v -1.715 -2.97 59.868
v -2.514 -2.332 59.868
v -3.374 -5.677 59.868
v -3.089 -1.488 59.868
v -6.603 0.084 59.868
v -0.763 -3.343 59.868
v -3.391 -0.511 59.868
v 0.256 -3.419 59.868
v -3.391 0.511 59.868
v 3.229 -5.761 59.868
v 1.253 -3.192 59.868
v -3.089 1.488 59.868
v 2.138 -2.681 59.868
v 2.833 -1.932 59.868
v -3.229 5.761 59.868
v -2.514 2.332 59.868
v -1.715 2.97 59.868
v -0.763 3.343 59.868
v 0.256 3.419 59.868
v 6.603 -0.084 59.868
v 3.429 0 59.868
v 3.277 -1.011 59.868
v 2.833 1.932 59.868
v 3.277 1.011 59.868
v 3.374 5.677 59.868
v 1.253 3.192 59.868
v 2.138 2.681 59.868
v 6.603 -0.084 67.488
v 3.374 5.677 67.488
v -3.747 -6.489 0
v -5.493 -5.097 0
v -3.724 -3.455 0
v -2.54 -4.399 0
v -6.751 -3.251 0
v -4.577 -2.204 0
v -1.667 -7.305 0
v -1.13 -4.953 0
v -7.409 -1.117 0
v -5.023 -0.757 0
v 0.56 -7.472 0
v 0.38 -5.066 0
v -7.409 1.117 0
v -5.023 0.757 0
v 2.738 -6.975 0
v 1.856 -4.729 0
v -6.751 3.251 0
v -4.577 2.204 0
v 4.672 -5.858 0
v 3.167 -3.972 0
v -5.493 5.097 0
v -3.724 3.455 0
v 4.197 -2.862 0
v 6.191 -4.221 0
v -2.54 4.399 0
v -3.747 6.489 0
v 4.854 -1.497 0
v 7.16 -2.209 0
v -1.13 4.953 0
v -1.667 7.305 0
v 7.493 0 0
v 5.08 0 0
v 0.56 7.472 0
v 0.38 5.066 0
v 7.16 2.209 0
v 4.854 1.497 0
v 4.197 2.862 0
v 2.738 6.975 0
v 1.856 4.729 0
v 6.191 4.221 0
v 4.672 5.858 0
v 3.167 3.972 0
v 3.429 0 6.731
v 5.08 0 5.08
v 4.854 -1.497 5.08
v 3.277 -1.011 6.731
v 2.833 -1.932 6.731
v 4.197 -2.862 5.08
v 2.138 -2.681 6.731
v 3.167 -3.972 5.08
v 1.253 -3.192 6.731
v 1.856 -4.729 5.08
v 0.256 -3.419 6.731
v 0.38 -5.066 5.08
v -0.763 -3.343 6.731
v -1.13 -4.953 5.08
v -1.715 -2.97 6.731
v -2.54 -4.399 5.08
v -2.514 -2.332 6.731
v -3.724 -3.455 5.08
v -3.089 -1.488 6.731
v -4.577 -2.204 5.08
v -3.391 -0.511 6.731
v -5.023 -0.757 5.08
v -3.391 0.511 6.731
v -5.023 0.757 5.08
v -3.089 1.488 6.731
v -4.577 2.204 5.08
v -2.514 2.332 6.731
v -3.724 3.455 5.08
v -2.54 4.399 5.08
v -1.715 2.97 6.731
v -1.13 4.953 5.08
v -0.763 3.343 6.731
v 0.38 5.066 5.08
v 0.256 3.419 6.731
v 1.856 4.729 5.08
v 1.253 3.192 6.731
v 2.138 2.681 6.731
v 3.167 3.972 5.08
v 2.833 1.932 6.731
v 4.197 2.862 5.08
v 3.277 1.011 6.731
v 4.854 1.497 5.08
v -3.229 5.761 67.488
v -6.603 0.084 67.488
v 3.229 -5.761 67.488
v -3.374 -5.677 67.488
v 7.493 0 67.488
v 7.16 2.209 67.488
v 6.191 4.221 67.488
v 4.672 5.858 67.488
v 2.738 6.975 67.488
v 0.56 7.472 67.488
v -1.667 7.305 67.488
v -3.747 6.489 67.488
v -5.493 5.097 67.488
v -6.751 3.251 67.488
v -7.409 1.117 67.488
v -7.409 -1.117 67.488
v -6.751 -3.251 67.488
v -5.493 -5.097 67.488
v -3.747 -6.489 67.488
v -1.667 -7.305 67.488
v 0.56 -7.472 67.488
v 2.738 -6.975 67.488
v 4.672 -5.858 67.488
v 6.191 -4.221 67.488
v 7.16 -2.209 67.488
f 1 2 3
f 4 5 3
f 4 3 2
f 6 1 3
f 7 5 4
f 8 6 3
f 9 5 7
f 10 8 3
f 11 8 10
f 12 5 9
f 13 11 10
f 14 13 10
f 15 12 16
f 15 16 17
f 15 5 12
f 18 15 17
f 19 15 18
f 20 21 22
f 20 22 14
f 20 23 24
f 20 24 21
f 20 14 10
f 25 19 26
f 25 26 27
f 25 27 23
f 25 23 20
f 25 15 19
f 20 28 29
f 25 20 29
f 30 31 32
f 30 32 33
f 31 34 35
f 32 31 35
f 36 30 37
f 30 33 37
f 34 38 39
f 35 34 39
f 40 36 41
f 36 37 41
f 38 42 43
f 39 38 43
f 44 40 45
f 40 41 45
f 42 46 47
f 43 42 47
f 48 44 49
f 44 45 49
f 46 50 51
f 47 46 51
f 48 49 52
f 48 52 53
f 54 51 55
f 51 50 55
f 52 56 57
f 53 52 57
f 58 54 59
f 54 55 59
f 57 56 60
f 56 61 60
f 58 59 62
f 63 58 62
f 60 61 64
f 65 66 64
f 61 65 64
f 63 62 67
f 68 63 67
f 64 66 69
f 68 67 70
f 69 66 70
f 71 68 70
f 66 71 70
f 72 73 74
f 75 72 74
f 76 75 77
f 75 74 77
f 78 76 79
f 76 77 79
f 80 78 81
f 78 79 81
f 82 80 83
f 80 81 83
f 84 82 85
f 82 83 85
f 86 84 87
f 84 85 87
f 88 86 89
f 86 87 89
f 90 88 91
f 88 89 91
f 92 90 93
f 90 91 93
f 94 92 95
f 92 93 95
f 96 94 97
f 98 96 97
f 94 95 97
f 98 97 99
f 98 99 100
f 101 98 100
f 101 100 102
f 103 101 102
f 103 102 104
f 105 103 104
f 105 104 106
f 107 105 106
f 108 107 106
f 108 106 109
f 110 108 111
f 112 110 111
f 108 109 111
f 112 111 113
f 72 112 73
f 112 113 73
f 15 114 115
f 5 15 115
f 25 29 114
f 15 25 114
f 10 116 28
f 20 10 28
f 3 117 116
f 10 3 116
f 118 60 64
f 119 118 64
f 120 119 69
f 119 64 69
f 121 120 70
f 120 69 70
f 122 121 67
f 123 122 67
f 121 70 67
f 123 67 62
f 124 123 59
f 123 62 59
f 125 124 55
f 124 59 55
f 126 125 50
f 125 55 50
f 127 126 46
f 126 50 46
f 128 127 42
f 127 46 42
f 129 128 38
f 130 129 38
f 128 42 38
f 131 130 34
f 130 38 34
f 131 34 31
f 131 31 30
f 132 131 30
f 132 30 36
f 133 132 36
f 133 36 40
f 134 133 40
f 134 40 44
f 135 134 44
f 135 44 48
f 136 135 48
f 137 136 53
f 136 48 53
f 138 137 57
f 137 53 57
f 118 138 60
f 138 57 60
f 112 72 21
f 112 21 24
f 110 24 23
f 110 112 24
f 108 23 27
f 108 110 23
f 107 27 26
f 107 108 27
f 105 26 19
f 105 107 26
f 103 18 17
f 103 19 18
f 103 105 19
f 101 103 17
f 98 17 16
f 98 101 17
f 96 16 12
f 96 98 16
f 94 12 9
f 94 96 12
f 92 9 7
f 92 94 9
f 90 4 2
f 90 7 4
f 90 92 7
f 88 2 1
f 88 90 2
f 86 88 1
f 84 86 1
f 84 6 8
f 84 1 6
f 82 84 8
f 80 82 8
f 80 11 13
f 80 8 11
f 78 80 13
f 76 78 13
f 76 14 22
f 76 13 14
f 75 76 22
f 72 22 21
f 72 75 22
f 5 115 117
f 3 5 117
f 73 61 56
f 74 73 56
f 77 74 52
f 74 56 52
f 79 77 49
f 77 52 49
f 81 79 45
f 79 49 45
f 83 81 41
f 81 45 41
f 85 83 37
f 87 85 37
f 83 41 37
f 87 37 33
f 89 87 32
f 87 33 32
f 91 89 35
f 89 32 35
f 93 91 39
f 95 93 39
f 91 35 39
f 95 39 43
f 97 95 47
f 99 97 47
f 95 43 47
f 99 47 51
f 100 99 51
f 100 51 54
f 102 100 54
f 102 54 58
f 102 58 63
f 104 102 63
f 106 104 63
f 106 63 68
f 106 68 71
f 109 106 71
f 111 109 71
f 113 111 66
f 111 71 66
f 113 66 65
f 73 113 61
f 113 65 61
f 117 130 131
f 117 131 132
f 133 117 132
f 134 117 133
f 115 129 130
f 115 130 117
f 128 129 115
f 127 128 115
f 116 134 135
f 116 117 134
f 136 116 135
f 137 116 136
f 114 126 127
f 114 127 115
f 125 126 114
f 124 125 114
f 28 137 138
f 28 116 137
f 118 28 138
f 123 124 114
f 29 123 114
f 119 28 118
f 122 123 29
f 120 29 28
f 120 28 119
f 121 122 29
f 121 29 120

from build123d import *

# Parameters (mm, degrees)
F0_R     = 7.493
F0_R_2   = 5.08
F0_R_3   = 3.429
F1_DEPTH = 67.4878
F2_R     = 5.08
F2_R_2   = 3.429
F3_DEPTH = 5.08
F4_SIZE  = 1.65099
F5_R     = 3.429
F6_DEPTH = 7.62


# Not quite as in the source:
# - a fillet or chamfer is up to 0.001 mm smaller than in the source, because OpenCascade refuses the exact size


with BuildPart() as f1:
    # F0 (on Top) → F1 (new body)
    with BuildSketch(Plane.XY):
        Circle(F0_R)
        Circle(F0_R_2, mode=Mode.SUBTRACT)
        Circle(F0_R_2)
        Circle(F0_R_3, mode=Mode.SUBTRACT)
    extrude(amount=F1_DEPTH)

    # F2 (on face) → F3 (cut)
    with BuildSketch(Plane(origin=(0, 0, 0), x_dir=(1, 0, 0), z_dir=(0, 0, -1))):
        Circle(F2_R)
        Circle(F2_R_2, mode=Mode.SUBTRACT)
    extrude(amount=-F3_DEPTH, mode=Mode.SUBTRACT)

    # F4 (size 1.651 in the source; OpenCascade refuses exactly that, so slightly less here)
    f4_edges = [f1.edges().sort_by_distance(p)[0] for p in [
        (-3.429, 0, 5.08),
    ]]
    chamfer(f4_edges, length=F4_SIZE)

    # F5 (on face) → F6 (cut)
    with BuildSketch(Plane.XY.offset(67.4878)):
        Polygon((6.6034672536, -0.0838822432), (3.3743777803, 5.6768292731), (-3.2290894733, 5.7607115163), (-6.6034672536, 0.0838822432), (-3.3743777803, -5.6768292731), (3.2290894733, -5.7607115163), align=None)
        Circle(F5_R, mode=Mode.SUBTRACT)
        Circle(F5_R)
    extrude(amount=-F6_DEPTH, mode=Mode.SUBTRACT)


solid = f1.part
